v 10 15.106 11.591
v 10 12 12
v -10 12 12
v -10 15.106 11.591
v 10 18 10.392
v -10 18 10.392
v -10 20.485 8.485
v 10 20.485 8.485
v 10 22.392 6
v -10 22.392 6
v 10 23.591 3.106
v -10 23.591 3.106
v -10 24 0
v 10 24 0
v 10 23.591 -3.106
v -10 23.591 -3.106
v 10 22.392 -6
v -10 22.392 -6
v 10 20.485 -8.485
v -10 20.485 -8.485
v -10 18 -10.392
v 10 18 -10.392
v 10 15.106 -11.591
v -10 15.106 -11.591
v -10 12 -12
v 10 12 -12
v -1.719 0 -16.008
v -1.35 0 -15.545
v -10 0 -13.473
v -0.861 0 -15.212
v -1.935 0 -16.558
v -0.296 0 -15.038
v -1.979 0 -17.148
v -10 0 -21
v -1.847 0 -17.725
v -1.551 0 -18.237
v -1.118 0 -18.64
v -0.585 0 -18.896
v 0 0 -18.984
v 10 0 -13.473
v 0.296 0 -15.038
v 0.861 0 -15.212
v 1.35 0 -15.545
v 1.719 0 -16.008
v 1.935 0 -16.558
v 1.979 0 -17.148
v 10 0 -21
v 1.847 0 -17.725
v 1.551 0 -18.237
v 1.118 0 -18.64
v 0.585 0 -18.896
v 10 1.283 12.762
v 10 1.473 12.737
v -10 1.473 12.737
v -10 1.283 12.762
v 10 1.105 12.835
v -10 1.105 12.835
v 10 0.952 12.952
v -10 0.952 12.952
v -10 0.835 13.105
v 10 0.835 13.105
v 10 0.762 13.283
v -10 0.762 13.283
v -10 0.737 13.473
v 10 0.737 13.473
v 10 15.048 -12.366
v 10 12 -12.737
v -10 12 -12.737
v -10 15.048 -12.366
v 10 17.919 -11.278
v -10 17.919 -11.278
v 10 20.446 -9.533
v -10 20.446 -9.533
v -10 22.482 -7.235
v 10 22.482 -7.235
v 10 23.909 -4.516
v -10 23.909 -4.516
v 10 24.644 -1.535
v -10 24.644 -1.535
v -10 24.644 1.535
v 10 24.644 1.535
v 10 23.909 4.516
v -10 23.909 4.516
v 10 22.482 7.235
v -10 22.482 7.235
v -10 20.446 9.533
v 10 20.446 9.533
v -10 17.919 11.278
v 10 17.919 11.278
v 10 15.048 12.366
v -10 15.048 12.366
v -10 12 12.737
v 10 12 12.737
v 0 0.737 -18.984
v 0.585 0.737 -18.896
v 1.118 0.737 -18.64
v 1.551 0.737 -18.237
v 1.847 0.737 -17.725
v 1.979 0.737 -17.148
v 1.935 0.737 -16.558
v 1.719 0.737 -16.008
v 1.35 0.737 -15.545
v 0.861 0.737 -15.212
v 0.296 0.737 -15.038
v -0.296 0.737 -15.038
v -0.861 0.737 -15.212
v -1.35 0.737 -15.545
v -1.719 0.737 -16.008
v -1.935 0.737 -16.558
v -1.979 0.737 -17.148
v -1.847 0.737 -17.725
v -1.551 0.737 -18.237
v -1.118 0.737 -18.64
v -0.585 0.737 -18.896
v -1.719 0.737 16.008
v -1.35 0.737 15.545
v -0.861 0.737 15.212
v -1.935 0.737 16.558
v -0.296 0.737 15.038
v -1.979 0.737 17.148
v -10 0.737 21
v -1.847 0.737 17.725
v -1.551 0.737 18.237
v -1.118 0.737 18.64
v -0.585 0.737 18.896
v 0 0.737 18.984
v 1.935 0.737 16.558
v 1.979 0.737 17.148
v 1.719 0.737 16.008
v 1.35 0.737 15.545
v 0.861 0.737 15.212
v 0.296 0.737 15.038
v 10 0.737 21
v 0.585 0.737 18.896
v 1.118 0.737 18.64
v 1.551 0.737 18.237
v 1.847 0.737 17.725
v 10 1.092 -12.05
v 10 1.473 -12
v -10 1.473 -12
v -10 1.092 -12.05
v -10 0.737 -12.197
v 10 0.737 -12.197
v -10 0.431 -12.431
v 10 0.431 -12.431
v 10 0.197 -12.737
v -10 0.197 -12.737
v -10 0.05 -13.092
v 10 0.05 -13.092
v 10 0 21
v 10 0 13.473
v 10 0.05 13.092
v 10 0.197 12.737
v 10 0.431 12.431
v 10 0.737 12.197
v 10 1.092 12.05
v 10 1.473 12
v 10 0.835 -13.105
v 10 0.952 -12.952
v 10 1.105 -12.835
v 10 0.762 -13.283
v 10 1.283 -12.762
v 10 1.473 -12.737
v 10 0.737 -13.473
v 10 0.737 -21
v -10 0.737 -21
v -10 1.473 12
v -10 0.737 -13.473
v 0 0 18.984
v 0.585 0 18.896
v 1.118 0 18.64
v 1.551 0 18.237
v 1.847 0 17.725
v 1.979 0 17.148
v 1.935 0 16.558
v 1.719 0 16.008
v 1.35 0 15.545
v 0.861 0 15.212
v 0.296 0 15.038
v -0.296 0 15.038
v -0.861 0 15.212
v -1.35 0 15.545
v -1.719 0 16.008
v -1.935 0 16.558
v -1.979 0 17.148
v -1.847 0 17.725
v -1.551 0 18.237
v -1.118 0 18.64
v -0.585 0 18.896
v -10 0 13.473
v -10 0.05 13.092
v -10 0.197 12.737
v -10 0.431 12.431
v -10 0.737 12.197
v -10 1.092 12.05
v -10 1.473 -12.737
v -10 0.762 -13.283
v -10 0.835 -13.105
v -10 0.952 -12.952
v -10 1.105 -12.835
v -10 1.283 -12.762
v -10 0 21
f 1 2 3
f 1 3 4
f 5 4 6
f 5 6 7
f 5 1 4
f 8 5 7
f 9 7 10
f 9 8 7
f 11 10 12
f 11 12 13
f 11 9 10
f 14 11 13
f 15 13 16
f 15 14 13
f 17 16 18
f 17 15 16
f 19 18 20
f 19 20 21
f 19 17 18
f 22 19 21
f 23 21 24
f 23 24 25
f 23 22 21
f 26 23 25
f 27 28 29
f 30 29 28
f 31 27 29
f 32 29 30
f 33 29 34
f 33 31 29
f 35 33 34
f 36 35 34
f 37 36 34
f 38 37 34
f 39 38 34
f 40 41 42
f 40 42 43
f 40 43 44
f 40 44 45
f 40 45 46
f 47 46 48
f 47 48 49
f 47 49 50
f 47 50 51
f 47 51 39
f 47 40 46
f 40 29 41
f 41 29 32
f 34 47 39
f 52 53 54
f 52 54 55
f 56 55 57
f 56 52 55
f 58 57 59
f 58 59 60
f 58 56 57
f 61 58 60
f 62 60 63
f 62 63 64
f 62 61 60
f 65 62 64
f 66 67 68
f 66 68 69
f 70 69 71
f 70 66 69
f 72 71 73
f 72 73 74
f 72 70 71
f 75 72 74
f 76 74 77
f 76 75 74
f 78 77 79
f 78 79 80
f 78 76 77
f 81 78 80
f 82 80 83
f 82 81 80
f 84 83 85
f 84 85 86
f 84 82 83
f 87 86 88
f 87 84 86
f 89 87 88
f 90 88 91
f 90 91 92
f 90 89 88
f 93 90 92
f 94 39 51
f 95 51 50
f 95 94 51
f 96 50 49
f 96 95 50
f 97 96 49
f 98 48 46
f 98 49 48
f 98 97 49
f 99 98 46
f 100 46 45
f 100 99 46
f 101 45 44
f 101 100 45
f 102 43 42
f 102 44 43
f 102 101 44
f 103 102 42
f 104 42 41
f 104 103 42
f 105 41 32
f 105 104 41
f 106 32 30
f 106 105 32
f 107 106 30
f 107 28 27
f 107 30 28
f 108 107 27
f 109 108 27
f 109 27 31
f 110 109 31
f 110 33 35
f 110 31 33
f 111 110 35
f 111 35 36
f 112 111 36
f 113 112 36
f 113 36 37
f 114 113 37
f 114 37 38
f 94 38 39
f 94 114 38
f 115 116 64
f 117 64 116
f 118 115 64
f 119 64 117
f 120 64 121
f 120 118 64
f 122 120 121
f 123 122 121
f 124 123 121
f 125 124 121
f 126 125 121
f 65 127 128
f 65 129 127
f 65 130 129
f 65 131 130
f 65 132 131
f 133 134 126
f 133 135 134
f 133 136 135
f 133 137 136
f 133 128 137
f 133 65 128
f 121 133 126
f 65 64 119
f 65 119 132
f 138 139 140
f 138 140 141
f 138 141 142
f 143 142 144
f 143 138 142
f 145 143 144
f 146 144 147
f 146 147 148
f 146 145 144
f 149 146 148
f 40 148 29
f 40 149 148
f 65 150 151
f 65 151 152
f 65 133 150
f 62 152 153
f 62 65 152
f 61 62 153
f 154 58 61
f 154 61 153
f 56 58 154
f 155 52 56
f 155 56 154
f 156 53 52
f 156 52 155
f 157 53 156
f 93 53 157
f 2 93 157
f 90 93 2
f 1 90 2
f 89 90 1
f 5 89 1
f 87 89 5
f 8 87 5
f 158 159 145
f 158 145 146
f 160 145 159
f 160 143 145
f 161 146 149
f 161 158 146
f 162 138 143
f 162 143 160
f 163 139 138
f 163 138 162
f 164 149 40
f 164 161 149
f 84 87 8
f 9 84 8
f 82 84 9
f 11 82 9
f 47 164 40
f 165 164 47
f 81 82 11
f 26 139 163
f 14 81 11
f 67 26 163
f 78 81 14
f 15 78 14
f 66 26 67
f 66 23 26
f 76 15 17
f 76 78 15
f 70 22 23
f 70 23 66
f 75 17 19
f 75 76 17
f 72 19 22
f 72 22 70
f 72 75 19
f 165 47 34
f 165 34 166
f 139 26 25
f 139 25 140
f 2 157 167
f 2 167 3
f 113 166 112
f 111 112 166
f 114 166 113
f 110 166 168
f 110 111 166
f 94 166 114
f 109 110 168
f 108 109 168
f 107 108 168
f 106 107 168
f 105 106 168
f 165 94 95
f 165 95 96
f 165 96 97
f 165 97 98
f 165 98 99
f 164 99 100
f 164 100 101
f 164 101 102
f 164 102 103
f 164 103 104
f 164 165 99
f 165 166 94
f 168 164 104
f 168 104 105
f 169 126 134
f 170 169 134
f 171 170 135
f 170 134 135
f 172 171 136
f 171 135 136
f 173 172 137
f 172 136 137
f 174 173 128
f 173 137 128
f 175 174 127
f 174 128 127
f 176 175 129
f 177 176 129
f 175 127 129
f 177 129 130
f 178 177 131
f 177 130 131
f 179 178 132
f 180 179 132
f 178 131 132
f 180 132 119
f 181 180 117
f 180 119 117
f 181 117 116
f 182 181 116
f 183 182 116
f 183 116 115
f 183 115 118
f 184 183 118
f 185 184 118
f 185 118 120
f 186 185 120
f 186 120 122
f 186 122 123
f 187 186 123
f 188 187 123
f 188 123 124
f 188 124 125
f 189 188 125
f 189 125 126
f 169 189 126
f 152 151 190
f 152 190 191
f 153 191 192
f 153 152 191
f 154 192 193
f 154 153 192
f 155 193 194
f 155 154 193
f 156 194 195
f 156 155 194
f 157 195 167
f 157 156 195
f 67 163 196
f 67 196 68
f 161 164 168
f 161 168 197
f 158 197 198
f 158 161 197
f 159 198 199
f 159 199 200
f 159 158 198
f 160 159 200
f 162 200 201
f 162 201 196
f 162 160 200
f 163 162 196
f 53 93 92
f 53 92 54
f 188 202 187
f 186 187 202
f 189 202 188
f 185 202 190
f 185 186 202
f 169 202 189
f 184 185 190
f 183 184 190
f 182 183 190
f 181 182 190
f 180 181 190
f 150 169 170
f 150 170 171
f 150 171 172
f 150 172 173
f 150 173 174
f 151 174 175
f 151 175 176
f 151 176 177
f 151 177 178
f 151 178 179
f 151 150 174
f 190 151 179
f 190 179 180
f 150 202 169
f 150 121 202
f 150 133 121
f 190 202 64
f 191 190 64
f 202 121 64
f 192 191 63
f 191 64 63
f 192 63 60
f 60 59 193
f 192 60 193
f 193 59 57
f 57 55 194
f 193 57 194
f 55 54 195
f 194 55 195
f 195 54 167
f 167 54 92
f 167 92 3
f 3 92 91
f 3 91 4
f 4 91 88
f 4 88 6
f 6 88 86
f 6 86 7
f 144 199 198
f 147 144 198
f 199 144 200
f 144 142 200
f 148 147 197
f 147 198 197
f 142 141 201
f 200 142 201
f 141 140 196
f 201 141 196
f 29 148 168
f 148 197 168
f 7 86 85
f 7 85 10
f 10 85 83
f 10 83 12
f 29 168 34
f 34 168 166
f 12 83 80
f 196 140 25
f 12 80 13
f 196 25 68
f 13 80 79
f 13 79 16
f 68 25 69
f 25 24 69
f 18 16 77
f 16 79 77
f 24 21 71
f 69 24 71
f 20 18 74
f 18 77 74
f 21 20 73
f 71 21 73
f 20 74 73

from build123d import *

# Parameters (mm, degrees)
BASE_FLANGE1_DEPTH = 10
SKETCH6_R          = 1.984375
CUT_EXTRUDE1_DEPTH = 34.421549934


# Sheet-metal steps are written as plain solids
with BuildPart() as part:
    # Sketch1 → Base-Flange1 (new, symmetric)
    with BuildSketch(Plane(origin=(0, 0, 0), x_dir=(0, 0, -1), z_dir=(1, 0, 0))):
        with BuildLine():
            Line((-21, 0), (-13.4732, 0))
            ThreePointArc((-13.4732, 0), (-12.43149029, 0.43149029), (-12, 1.4732))
            Line((-12, 1.4732), (-12, 12))
            ThreePointArc((-12, 12), (0, 24), (12, 12))
            Line((12, 12), (12, 1.4732))
            ThreePointArc((12, 1.4732), (12.43149029, 0.43149029), (13.4732, 0))
            Line((13.4732, 0), (21, 0))
            Line((21, 0), (21, 0.7366))
            Line((21, 0.7366), (13.4732, 0.7366))
            ThreePointArc((13.4732, 0.7366), (12.952345145, 0.952345145), (12.7366, 1.4732))
            Line((12.7366, 1.4732), (12.7366, 12))
            ThreePointArc((12.7366, 12), (0, 24.7366), (-12.7366, 12))
            Line((-12.7366, 12), (-12.7366, 1.4732))
            ThreePointArc((-12.7366, 1.4732), (-12.952345145, 0.952345145), (-13.4732, 0.7366))
            Line((-13.4732, 0.7366), (-21, 0.7366))
            Line((-21, 0.7366), (-21, 0))
        make_face()
    extrude(amount=BASE_FLANGE1_DEPTH, both=True)

    # Sketch6 → Cut-Extrude1 (cut, through all)
    with BuildSketch(Plane(origin=(0, 0.7366, 0), x_dir=(1, 0, 0), z_dir=(0, 1, 0))):
        with Locations(Location((0, -17, 0), (0, 0, 270))):
            Circle(SKETCH6_R)
    cut_extrude1 = extrude(amount=-CUT_EXTRUDE1_DEPTH, mode=Mode.SUBTRACT)

    # Mirror1: Cut-Extrude1 across plane
    add(cut_extrude1.mirror(Plane.XY), mode=Mode.SUBTRACT)


solid = part.part
